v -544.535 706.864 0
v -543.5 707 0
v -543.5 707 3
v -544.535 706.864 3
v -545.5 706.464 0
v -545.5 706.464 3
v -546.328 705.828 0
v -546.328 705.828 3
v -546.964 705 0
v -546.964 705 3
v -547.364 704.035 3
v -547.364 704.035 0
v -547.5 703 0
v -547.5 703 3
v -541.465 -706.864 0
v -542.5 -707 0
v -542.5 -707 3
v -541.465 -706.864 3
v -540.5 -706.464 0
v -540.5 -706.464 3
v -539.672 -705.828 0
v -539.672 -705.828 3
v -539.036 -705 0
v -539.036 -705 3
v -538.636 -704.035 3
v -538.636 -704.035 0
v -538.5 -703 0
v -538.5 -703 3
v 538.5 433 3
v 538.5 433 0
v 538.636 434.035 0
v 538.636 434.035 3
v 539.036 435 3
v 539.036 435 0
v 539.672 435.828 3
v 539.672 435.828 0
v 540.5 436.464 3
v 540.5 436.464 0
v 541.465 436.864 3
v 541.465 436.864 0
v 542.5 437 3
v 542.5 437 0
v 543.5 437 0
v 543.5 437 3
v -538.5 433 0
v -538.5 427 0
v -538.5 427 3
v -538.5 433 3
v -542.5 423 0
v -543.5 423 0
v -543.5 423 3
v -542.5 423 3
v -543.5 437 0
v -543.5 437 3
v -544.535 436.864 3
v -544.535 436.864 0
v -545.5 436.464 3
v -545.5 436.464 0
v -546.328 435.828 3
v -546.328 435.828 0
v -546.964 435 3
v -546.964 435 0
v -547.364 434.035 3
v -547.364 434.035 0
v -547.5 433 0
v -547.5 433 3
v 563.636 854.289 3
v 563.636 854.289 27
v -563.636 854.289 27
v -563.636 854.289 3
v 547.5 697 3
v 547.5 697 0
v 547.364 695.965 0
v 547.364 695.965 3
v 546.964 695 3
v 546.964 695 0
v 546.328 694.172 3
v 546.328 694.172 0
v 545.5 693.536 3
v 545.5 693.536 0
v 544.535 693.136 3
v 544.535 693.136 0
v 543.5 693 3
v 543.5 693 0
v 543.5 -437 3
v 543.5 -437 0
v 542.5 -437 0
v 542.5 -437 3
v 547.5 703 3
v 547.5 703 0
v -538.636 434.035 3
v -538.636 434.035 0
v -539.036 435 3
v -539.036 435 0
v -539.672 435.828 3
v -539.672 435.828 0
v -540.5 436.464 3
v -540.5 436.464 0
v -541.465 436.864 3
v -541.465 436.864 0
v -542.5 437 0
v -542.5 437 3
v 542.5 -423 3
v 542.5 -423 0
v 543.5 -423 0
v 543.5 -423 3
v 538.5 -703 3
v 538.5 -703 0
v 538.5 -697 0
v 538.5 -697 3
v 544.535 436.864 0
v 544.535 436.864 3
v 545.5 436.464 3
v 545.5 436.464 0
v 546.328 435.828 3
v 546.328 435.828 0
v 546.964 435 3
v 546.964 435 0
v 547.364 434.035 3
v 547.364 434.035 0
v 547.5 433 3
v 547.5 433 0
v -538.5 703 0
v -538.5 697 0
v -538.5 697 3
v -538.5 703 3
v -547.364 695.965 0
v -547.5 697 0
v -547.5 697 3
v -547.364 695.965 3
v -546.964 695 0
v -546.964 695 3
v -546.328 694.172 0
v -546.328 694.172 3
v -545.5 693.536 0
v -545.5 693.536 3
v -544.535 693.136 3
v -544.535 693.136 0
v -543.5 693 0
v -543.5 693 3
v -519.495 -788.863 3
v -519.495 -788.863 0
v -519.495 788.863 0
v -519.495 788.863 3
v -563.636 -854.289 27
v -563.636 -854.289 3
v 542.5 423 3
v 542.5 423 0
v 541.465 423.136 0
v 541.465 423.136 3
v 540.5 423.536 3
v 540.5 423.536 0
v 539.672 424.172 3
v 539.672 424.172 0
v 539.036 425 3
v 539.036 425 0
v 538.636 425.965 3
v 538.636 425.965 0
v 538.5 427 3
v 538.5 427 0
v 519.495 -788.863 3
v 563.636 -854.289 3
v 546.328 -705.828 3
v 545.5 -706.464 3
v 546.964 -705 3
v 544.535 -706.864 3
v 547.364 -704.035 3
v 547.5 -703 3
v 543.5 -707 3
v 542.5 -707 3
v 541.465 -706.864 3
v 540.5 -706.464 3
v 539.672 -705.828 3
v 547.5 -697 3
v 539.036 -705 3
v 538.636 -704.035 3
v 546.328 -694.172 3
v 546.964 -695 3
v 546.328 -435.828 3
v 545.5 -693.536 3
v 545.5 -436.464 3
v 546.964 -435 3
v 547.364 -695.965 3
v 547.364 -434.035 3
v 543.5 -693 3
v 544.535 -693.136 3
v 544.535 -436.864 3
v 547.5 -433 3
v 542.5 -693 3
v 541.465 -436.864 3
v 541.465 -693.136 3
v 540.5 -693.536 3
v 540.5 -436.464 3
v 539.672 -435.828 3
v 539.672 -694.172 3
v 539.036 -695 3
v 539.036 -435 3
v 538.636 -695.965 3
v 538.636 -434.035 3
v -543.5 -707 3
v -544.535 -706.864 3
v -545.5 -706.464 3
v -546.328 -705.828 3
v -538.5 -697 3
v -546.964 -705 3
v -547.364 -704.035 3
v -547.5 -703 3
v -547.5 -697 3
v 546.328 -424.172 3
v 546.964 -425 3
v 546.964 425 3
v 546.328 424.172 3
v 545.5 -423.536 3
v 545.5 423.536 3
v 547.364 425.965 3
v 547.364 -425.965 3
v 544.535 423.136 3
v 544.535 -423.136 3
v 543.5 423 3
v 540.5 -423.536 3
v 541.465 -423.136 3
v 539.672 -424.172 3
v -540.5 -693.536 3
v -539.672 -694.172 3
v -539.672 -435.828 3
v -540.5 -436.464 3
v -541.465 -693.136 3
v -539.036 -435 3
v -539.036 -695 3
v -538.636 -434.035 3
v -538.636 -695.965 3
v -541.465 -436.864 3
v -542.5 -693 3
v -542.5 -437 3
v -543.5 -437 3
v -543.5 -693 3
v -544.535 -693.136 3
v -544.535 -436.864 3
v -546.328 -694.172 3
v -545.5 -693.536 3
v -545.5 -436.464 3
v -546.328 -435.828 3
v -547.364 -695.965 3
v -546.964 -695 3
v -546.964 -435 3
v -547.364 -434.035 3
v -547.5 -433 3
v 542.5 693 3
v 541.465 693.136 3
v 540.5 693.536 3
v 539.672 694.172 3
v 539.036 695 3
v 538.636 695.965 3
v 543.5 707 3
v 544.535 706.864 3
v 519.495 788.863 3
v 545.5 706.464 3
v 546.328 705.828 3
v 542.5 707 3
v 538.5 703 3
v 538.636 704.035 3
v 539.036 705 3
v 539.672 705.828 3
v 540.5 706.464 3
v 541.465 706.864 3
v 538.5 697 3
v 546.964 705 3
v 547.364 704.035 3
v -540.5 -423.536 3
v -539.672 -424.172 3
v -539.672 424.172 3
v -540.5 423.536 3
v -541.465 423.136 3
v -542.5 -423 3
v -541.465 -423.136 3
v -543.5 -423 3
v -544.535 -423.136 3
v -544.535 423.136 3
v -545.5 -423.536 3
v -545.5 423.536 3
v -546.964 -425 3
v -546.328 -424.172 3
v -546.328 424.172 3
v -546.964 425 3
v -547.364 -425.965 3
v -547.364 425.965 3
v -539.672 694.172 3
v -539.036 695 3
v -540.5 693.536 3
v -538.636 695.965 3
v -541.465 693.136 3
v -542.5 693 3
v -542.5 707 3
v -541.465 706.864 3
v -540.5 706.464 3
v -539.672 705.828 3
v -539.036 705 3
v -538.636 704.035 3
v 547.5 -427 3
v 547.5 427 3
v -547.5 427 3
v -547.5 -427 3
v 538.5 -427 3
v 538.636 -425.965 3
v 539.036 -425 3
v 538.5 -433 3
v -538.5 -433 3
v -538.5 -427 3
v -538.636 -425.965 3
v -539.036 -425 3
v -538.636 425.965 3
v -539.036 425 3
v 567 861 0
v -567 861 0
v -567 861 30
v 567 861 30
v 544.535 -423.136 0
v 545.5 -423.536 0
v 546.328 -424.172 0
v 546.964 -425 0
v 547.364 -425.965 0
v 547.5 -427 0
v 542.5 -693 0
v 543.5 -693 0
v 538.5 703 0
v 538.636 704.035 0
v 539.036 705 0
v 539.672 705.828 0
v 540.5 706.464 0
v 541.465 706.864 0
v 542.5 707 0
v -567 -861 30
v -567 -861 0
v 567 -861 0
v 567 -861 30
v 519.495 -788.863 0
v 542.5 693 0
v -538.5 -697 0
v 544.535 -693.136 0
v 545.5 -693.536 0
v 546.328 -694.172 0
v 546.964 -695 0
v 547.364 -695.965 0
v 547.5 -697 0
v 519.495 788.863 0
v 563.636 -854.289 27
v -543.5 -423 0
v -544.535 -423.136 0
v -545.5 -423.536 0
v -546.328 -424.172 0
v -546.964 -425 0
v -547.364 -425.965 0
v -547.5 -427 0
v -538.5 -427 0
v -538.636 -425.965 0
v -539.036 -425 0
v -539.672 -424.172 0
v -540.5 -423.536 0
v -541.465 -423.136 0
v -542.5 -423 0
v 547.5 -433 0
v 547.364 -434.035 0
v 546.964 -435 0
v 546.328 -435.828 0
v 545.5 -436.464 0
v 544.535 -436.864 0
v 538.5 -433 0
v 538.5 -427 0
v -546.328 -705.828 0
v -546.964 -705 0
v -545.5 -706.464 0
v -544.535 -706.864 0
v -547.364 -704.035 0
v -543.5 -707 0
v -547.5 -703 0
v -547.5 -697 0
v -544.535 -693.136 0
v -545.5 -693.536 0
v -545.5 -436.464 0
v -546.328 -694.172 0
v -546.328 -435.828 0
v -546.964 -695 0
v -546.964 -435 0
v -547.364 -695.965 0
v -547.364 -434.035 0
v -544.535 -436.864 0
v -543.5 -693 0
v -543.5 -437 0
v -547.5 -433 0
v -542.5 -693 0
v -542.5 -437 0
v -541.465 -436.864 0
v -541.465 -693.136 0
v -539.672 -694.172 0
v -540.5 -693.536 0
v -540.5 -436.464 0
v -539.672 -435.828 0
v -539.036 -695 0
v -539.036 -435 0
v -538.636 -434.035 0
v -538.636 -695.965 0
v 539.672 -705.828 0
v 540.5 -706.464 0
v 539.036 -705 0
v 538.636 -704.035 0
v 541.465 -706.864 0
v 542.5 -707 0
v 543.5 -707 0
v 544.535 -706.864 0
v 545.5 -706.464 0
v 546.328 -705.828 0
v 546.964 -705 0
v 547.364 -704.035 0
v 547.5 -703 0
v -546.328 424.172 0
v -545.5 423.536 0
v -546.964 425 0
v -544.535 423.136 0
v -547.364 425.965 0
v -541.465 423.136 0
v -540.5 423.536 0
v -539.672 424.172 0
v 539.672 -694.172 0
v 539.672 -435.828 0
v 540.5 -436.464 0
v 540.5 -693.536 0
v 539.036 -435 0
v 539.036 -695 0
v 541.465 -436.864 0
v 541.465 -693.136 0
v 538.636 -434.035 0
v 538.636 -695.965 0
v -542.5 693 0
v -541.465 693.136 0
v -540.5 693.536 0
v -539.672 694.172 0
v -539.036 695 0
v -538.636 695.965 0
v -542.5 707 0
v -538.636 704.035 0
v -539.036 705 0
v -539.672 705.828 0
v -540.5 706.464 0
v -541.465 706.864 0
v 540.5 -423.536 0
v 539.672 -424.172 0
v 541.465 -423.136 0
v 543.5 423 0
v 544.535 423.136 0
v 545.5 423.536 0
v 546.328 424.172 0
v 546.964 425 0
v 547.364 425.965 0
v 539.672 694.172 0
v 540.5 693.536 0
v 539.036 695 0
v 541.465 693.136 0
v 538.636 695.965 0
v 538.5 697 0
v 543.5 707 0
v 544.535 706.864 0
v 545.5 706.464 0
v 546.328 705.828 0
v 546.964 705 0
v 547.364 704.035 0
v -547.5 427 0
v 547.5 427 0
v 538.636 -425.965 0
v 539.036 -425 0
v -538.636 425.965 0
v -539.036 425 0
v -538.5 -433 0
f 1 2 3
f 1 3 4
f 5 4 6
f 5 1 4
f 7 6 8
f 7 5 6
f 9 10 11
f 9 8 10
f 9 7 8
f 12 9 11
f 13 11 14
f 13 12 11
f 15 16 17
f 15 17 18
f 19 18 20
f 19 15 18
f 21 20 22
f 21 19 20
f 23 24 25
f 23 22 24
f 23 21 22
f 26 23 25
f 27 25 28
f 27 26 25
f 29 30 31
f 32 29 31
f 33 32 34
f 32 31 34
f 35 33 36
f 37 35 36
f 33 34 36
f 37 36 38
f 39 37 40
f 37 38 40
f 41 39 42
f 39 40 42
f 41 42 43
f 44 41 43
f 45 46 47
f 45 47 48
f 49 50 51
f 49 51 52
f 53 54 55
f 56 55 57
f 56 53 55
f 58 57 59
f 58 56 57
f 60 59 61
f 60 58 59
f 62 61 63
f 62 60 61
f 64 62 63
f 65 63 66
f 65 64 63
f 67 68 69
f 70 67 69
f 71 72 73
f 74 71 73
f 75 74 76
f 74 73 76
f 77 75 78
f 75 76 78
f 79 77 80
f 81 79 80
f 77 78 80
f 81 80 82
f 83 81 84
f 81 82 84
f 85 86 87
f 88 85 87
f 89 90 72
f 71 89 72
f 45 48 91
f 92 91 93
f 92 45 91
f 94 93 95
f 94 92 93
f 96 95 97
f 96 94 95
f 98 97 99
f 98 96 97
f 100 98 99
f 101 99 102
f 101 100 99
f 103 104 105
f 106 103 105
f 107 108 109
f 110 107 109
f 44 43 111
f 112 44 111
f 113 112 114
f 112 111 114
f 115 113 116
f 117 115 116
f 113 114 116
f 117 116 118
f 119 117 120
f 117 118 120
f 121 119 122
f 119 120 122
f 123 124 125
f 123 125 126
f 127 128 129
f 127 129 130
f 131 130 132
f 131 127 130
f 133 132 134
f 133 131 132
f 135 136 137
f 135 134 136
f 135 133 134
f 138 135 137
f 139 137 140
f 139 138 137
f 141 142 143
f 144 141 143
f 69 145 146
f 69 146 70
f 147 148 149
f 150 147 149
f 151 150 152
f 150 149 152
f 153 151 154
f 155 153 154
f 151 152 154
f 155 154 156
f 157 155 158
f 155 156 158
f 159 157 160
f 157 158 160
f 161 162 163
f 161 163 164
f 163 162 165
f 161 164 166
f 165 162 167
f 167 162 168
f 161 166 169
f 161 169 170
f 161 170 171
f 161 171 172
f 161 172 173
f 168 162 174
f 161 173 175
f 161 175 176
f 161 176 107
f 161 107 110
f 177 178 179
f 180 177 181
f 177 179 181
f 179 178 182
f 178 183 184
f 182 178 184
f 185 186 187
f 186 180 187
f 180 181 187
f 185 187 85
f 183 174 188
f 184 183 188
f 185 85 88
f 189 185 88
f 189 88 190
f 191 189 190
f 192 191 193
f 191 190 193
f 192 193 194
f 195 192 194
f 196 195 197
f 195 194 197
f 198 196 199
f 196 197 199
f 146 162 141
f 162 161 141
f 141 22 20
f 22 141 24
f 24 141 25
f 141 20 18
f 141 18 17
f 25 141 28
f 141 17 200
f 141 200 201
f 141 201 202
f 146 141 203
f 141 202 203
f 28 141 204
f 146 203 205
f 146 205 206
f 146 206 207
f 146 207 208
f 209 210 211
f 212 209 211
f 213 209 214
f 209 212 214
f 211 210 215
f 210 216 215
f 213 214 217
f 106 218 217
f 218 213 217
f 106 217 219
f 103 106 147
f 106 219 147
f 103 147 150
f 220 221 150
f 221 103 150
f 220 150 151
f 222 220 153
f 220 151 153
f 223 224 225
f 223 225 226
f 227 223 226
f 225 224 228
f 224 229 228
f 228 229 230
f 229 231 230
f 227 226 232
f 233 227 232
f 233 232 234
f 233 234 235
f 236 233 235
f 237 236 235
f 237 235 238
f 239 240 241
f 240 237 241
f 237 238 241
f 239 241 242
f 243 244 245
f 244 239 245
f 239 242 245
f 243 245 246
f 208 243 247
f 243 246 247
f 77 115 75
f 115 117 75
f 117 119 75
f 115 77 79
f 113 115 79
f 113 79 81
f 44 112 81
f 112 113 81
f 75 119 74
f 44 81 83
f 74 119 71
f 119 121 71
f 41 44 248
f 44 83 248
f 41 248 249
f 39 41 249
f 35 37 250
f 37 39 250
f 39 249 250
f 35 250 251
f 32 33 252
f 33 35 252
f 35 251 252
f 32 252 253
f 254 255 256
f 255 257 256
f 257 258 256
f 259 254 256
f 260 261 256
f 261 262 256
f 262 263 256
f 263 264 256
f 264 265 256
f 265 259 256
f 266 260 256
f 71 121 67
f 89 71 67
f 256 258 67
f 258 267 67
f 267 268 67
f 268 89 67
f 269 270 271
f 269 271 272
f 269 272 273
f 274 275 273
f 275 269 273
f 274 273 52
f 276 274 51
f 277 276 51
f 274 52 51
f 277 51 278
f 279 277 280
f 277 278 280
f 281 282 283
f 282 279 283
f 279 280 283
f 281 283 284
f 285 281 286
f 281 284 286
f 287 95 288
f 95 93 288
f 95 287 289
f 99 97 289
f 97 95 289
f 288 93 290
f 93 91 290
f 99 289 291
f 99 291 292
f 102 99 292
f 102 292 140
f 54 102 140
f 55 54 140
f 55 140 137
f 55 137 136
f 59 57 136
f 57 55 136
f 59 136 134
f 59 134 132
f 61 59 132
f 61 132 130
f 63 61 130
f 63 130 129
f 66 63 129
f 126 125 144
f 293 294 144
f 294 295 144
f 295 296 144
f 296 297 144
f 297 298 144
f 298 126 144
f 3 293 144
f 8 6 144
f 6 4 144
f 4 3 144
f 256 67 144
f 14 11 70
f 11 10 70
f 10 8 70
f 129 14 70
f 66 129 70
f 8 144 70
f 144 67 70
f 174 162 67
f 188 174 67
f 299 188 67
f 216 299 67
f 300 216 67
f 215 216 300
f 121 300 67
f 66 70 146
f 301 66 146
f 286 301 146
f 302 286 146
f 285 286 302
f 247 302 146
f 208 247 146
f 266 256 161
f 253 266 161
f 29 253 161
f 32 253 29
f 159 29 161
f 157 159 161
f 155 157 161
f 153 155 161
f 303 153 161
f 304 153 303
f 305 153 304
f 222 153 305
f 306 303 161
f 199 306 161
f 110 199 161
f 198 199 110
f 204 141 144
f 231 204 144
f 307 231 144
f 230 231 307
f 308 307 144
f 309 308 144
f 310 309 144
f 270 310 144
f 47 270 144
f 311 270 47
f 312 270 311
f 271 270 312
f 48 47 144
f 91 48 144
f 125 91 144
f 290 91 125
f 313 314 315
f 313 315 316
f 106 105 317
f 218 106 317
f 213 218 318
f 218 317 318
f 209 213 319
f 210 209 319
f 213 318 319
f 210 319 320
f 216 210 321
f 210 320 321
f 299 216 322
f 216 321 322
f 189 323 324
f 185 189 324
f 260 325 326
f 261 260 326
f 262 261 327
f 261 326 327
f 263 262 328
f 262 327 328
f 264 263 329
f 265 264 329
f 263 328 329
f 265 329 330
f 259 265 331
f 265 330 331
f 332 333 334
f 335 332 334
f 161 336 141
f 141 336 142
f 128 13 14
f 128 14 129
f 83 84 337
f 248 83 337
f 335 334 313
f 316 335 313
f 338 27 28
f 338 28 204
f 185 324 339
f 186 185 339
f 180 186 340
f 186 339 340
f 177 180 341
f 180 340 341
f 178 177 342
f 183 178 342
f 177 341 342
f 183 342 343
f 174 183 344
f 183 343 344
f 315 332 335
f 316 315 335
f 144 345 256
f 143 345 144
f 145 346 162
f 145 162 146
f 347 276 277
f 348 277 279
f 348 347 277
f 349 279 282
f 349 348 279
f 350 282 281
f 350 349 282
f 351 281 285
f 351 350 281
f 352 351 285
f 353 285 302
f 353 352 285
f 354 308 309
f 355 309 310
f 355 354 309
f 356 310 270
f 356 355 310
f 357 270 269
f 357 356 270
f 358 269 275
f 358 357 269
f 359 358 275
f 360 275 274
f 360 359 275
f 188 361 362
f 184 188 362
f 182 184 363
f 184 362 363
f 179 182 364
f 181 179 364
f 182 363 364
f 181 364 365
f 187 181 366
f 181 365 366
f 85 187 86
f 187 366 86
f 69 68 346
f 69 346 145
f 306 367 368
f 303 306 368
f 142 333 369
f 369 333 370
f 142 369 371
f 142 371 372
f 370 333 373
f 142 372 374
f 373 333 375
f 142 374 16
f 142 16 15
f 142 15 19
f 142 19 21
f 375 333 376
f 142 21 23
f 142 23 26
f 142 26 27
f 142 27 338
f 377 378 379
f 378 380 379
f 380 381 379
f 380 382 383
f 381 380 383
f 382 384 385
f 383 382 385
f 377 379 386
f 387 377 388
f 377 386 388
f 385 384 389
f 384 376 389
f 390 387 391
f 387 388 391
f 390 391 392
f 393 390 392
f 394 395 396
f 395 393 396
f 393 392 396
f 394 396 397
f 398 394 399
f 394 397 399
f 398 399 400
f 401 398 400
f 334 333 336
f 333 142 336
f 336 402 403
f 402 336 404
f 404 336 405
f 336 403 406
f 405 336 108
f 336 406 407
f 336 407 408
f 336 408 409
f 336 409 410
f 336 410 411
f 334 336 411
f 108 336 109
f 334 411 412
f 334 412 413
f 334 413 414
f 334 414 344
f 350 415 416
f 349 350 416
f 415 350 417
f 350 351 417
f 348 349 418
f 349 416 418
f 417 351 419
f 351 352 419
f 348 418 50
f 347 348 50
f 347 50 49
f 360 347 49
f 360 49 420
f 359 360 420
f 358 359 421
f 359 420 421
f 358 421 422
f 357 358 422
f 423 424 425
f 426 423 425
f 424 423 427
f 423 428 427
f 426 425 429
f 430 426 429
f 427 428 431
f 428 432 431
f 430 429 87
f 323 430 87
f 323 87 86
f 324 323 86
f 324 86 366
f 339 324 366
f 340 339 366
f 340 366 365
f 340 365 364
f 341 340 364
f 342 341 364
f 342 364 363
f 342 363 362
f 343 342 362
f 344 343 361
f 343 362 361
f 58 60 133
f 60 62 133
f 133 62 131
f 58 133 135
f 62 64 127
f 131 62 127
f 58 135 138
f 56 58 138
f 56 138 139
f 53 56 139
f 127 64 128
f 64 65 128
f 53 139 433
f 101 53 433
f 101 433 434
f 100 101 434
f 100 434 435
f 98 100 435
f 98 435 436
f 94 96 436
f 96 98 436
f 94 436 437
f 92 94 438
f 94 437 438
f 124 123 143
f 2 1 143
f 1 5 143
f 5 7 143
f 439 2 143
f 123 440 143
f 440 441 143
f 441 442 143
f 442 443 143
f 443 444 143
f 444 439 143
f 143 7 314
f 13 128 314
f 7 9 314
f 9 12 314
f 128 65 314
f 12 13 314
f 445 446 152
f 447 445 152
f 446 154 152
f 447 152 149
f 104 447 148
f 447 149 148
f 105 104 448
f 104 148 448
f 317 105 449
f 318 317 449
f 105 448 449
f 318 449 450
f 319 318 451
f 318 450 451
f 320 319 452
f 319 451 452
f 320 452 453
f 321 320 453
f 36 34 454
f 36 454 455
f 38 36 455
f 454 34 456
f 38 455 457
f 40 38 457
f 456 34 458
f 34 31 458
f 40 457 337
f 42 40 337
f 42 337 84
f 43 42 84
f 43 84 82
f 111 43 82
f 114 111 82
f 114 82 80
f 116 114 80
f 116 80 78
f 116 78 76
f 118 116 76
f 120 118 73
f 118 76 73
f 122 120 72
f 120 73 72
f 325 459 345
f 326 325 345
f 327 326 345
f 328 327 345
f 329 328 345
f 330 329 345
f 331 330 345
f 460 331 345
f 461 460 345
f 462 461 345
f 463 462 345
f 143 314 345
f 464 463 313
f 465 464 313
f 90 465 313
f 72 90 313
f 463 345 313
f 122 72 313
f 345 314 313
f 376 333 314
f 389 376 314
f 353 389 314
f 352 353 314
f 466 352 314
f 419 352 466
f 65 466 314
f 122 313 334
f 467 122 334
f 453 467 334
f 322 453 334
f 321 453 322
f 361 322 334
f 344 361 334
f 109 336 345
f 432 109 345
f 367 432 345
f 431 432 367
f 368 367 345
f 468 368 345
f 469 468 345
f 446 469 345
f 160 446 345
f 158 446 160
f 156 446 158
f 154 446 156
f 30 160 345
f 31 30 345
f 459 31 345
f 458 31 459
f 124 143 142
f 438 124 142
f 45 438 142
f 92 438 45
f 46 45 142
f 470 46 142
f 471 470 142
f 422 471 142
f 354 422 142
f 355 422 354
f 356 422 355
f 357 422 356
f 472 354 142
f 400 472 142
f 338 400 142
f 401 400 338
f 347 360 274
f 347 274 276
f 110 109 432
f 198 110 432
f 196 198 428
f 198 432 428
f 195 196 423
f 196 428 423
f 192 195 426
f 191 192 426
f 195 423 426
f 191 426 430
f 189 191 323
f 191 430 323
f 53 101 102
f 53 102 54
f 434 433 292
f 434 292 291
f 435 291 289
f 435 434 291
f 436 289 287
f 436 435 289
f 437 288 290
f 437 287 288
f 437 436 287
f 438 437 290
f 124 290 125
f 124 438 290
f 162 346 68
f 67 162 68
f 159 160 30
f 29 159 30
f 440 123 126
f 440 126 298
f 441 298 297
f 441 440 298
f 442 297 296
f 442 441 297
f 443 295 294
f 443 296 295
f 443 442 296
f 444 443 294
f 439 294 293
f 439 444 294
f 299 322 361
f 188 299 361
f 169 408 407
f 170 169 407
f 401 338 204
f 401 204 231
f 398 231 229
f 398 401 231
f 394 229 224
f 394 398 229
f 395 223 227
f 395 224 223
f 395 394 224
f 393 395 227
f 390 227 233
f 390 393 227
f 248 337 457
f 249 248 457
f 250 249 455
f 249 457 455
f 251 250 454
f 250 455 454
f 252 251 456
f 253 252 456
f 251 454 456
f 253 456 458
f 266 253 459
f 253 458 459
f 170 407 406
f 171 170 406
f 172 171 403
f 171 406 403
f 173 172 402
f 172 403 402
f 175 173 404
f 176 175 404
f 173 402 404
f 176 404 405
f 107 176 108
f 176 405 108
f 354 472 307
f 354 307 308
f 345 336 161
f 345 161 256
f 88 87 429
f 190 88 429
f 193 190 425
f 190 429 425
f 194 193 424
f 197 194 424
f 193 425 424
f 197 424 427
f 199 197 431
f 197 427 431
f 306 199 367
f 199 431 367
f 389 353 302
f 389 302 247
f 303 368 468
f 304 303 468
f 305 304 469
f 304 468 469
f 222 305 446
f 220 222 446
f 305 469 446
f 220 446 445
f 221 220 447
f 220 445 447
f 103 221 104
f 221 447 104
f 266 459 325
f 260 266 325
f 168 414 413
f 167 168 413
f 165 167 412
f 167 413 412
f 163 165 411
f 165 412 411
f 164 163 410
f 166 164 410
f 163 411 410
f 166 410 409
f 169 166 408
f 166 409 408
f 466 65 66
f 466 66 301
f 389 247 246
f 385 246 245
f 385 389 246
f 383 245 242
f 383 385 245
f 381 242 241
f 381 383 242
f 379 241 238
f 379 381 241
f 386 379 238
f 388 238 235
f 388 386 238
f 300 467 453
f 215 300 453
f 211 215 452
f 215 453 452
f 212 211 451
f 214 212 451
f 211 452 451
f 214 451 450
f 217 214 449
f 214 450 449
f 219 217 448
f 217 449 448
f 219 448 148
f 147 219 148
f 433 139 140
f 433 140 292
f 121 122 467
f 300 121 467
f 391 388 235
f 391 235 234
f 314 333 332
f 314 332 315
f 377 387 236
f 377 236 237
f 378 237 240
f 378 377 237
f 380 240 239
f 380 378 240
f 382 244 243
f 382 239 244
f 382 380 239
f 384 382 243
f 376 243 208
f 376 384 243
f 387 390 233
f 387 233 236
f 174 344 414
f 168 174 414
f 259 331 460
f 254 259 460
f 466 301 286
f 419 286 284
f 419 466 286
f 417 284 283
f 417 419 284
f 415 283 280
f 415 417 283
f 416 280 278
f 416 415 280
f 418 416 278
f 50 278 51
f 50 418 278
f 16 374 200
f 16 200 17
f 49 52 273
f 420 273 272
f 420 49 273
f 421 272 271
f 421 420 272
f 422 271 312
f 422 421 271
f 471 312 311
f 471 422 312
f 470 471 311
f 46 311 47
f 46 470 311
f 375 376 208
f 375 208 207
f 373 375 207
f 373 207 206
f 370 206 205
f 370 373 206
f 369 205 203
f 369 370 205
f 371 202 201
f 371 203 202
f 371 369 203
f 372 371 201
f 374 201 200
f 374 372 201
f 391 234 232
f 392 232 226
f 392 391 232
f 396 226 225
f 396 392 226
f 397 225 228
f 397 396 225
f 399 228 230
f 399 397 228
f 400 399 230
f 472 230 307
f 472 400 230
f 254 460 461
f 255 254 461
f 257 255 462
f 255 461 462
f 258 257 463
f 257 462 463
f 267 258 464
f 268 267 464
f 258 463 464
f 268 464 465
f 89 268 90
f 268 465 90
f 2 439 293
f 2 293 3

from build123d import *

# Parameters (mm, degrees)
ESQUISSE1_W             = 1134
ESQUISSE1_H             = 1722
BOSS_EXTRU_1_DEPTH      = 30
ESQUISSE6_W             = 1038.990735542
ESQUISSE6_H             = 1577.726672488
ENL_V_MAT_EXTRU_1_DEPTH = 27
ESQUISSE7_W             = 1127.272234852
ESQUISSE7_H             = 1708.57841833
ENL_V_MAT_EXTRU_2_DEPTH = 24
ENL_V_MAT_EXTRU_3_DEPTH = 10


with BuildPart() as part:
    # Esquisse1 → Boss.-Extru.1 (new body)
    with BuildSketch(Plane.XY):
        Rectangle(ESQUISSE1_W, ESQUISSE1_H)
    extrude(amount=BOSS_EXTRU_1_DEPTH)

    # Esquisse6 → Enlèv. mat.-Extru.1 (cut)
    with BuildSketch(Plane(origin=(0, 0, 0), x_dir=(-1, 0, 0), z_dir=(0, 0, -1))):
        Rectangle(ESQUISSE6_W, ESQUISSE6_H)
    extrude(amount=-ENL_V_MAT_EXTRU_1_DEPTH, mode=Mode.SUBTRACT)

    # Esquisse7 → Enlèv. mat.-Extru.2 (cut)
    with BuildSketch(Plane(origin=(0, 0, 27), x_dir=(-1, 0, 0), z_dir=(0, 0, -1))):
        Rectangle(ESQUISSE7_W, ESQUISSE7_H)
    extrude(amount=ENL_V_MAT_EXTRU_2_DEPTH, mode=Mode.SUBTRACT)

    # trous fixation → Enlèv. mat.-Extru.3 (cut)
    with BuildSketch(Plane(origin=(0, 0, 0), x_dir=(-1, 0, 0), z_dir=(0, 0, -1))):
        with BuildLine():
            Line((-543.5, 693), (-542.5, 693))
            ThreePointArc((-542.5, 693), (-539.671572875, 694.171572875), (-538.5, 697))
            Line((-538.5, 697), (-538.5, 703))
            ThreePointArc((-538.5, 703), (-539.671572875, 705.828427125), (-542.5, 707))
            Line((-542.5, 707), (-543.5, 707))
            ThreePointArc((-543.5, 707), (-546.328427125, 705.828427125), (-547.5, 703))
            Line((-547.5, 703), (-547.5, 697))
            ThreePointArc((-547.5, 697), (-546.328427125, 694.171572875), (-543.5, 693))
        make_face()
        with BuildLine():
            Line((-543.5, 423), (-542.5, 423))
            ThreePointArc((-542.5, 423), (-539.671572875, 424.171572875), (-538.5, 427))
            Line((-538.5, 427), (-538.5, 433))
            ThreePointArc((-538.5, 433), (-539.671572875, 435.828427125), (-542.5, 437))
            Line((-542.5, 437), (-543.5, 437))
            ThreePointArc((-543.5, 437), (-546.328427125, 435.828427125), (-547.5, 433))
            Line((-547.5, 433), (-547.5, 427))
            ThreePointArc((-547.5, 427), (-546.328427125, 424.171572875), (-543.5, 423))
        make_face()
        with BuildLine():
            Line((-543.5, -437), (-542.5, -437))
            ThreePointArc((-542.5, -437), (-539.671572875, -435.828427125), (-538.5, -433))
            Line((-538.5, -433), (-538.5, -427))
            ThreePointArc((-538.5, -427), (-539.671572875, -424.171572875), (-542.5, -423))
            Line((-542.5, -423), (-543.5, -423))
            ThreePointArc((-543.5, -423), (-546.328427125, -424.171572875), (-547.5, -427))
            Line((-547.5, -427), (-547.5, -433))
            ThreePointArc((-547.5, -433), (-546.328427125, -435.828427125), (-543.5, -437))
        make_face()
        with BuildLine():
            Line((-543.5, -707), (-542.5, -707))
            ThreePointArc((-542.5, -707), (-539.671572875, -705.828427125), (-538.5, -703))
            Line((-538.5, -703), (-538.5, -697))
            ThreePointArc((-538.5, -697), (-539.671572875, -694.171572875), (-542.5, -693))
            Line((-542.5, -693), (-543.5, -693))
            ThreePointArc((-543.5, -693), (-546.328427125, -694.171572875), (-547.5, -697))
            Line((-547.5, -697), (-547.5, -703))
            ThreePointArc((-547.5, -703), (-546.328427125, -705.828427125), (-543.5, -707))
        make_face()
        with BuildLine():
            Line((538.5, -703), (538.5, -697))
            ThreePointArc((538.5, -697), (539.671572875, -694.171572875), (542.5, -693))
            Line((542.5, -693), (543.5, -693))
            ThreePointArc((543.5, -693), (546.328427125, -694.171572875), (547.5, -697))
            Line((547.5, -697), (547.5, -703))
            ThreePointArc((547.5, -703), (546.328427125, -705.828427125), (543.5, -707))
            Line((543.5, -707), (542.5, -707))
            ThreePointArc((542.5, -707), (539.671572875, -705.828427125), (538.5, -703))
        make_face()
        with BuildLine():
            Line((538.5, -433), (538.5, -427))
            ThreePointArc((538.5, -427), (539.671572875, -424.171572875), (542.5, -423))
            Line((542.5, -423), (543.5, -423))
            ThreePointArc((543.5, -423), (546.328427125, -424.171572875), (547.5, -427))
            Line((547.5, -427), (547.5, -433))
            ThreePointArc((547.5, -433), (546.328427125, -435.828427125), (543.5, -437))
            Line((543.5, -437), (542.5, -437))
            ThreePointArc((542.5, -437), (539.671572875, -435.828427125), (538.5, -433))
        make_face()
        with BuildLine():
            Line((538.5, 427), (538.5, 433))
            ThreePointArc((538.5, 433), (539.671572875, 435.828427125), (542.5, 437))
            Line((542.5, 437), (543.5, 437))
            ThreePointArc((543.5, 437), (546.328427125, 435.828427125), (547.5, 433))
            Line((547.5, 433), (547.5, 427))
            ThreePointArc((547.5, 427), (546.328427125, 424.171572875), (543.5, 423))
            Line((543.5, 423), (542.5, 423))
            ThreePointArc((542.5, 423), (539.671572875, 424.171572875), (538.5, 427))
        make_face()
        with BuildLine():
            Line((538.5, 697), (538.5, 703))
            ThreePointArc((538.5, 703), (539.671572875, 705.828427125), (542.5, 707))
            Line((542.5, 707), (543.5, 707))
            ThreePointArc((543.5, 707), (546.328427125, 705.828427125), (547.5, 703))
            Line((547.5, 703), (547.5, 697))
            ThreePointArc((547.5, 697), (546.328427125, 694.171572875), (543.5, 693))
            Line((543.5, 693), (542.5, 693))
            ThreePointArc((542.5, 693), (539.671572875, 694.171572875), (538.5, 697))
        make_face()
    extrude(amount=-ENL_V_MAT_EXTRU_3_DEPTH, mode=Mode.SUBTRACT)


solid = part.part
